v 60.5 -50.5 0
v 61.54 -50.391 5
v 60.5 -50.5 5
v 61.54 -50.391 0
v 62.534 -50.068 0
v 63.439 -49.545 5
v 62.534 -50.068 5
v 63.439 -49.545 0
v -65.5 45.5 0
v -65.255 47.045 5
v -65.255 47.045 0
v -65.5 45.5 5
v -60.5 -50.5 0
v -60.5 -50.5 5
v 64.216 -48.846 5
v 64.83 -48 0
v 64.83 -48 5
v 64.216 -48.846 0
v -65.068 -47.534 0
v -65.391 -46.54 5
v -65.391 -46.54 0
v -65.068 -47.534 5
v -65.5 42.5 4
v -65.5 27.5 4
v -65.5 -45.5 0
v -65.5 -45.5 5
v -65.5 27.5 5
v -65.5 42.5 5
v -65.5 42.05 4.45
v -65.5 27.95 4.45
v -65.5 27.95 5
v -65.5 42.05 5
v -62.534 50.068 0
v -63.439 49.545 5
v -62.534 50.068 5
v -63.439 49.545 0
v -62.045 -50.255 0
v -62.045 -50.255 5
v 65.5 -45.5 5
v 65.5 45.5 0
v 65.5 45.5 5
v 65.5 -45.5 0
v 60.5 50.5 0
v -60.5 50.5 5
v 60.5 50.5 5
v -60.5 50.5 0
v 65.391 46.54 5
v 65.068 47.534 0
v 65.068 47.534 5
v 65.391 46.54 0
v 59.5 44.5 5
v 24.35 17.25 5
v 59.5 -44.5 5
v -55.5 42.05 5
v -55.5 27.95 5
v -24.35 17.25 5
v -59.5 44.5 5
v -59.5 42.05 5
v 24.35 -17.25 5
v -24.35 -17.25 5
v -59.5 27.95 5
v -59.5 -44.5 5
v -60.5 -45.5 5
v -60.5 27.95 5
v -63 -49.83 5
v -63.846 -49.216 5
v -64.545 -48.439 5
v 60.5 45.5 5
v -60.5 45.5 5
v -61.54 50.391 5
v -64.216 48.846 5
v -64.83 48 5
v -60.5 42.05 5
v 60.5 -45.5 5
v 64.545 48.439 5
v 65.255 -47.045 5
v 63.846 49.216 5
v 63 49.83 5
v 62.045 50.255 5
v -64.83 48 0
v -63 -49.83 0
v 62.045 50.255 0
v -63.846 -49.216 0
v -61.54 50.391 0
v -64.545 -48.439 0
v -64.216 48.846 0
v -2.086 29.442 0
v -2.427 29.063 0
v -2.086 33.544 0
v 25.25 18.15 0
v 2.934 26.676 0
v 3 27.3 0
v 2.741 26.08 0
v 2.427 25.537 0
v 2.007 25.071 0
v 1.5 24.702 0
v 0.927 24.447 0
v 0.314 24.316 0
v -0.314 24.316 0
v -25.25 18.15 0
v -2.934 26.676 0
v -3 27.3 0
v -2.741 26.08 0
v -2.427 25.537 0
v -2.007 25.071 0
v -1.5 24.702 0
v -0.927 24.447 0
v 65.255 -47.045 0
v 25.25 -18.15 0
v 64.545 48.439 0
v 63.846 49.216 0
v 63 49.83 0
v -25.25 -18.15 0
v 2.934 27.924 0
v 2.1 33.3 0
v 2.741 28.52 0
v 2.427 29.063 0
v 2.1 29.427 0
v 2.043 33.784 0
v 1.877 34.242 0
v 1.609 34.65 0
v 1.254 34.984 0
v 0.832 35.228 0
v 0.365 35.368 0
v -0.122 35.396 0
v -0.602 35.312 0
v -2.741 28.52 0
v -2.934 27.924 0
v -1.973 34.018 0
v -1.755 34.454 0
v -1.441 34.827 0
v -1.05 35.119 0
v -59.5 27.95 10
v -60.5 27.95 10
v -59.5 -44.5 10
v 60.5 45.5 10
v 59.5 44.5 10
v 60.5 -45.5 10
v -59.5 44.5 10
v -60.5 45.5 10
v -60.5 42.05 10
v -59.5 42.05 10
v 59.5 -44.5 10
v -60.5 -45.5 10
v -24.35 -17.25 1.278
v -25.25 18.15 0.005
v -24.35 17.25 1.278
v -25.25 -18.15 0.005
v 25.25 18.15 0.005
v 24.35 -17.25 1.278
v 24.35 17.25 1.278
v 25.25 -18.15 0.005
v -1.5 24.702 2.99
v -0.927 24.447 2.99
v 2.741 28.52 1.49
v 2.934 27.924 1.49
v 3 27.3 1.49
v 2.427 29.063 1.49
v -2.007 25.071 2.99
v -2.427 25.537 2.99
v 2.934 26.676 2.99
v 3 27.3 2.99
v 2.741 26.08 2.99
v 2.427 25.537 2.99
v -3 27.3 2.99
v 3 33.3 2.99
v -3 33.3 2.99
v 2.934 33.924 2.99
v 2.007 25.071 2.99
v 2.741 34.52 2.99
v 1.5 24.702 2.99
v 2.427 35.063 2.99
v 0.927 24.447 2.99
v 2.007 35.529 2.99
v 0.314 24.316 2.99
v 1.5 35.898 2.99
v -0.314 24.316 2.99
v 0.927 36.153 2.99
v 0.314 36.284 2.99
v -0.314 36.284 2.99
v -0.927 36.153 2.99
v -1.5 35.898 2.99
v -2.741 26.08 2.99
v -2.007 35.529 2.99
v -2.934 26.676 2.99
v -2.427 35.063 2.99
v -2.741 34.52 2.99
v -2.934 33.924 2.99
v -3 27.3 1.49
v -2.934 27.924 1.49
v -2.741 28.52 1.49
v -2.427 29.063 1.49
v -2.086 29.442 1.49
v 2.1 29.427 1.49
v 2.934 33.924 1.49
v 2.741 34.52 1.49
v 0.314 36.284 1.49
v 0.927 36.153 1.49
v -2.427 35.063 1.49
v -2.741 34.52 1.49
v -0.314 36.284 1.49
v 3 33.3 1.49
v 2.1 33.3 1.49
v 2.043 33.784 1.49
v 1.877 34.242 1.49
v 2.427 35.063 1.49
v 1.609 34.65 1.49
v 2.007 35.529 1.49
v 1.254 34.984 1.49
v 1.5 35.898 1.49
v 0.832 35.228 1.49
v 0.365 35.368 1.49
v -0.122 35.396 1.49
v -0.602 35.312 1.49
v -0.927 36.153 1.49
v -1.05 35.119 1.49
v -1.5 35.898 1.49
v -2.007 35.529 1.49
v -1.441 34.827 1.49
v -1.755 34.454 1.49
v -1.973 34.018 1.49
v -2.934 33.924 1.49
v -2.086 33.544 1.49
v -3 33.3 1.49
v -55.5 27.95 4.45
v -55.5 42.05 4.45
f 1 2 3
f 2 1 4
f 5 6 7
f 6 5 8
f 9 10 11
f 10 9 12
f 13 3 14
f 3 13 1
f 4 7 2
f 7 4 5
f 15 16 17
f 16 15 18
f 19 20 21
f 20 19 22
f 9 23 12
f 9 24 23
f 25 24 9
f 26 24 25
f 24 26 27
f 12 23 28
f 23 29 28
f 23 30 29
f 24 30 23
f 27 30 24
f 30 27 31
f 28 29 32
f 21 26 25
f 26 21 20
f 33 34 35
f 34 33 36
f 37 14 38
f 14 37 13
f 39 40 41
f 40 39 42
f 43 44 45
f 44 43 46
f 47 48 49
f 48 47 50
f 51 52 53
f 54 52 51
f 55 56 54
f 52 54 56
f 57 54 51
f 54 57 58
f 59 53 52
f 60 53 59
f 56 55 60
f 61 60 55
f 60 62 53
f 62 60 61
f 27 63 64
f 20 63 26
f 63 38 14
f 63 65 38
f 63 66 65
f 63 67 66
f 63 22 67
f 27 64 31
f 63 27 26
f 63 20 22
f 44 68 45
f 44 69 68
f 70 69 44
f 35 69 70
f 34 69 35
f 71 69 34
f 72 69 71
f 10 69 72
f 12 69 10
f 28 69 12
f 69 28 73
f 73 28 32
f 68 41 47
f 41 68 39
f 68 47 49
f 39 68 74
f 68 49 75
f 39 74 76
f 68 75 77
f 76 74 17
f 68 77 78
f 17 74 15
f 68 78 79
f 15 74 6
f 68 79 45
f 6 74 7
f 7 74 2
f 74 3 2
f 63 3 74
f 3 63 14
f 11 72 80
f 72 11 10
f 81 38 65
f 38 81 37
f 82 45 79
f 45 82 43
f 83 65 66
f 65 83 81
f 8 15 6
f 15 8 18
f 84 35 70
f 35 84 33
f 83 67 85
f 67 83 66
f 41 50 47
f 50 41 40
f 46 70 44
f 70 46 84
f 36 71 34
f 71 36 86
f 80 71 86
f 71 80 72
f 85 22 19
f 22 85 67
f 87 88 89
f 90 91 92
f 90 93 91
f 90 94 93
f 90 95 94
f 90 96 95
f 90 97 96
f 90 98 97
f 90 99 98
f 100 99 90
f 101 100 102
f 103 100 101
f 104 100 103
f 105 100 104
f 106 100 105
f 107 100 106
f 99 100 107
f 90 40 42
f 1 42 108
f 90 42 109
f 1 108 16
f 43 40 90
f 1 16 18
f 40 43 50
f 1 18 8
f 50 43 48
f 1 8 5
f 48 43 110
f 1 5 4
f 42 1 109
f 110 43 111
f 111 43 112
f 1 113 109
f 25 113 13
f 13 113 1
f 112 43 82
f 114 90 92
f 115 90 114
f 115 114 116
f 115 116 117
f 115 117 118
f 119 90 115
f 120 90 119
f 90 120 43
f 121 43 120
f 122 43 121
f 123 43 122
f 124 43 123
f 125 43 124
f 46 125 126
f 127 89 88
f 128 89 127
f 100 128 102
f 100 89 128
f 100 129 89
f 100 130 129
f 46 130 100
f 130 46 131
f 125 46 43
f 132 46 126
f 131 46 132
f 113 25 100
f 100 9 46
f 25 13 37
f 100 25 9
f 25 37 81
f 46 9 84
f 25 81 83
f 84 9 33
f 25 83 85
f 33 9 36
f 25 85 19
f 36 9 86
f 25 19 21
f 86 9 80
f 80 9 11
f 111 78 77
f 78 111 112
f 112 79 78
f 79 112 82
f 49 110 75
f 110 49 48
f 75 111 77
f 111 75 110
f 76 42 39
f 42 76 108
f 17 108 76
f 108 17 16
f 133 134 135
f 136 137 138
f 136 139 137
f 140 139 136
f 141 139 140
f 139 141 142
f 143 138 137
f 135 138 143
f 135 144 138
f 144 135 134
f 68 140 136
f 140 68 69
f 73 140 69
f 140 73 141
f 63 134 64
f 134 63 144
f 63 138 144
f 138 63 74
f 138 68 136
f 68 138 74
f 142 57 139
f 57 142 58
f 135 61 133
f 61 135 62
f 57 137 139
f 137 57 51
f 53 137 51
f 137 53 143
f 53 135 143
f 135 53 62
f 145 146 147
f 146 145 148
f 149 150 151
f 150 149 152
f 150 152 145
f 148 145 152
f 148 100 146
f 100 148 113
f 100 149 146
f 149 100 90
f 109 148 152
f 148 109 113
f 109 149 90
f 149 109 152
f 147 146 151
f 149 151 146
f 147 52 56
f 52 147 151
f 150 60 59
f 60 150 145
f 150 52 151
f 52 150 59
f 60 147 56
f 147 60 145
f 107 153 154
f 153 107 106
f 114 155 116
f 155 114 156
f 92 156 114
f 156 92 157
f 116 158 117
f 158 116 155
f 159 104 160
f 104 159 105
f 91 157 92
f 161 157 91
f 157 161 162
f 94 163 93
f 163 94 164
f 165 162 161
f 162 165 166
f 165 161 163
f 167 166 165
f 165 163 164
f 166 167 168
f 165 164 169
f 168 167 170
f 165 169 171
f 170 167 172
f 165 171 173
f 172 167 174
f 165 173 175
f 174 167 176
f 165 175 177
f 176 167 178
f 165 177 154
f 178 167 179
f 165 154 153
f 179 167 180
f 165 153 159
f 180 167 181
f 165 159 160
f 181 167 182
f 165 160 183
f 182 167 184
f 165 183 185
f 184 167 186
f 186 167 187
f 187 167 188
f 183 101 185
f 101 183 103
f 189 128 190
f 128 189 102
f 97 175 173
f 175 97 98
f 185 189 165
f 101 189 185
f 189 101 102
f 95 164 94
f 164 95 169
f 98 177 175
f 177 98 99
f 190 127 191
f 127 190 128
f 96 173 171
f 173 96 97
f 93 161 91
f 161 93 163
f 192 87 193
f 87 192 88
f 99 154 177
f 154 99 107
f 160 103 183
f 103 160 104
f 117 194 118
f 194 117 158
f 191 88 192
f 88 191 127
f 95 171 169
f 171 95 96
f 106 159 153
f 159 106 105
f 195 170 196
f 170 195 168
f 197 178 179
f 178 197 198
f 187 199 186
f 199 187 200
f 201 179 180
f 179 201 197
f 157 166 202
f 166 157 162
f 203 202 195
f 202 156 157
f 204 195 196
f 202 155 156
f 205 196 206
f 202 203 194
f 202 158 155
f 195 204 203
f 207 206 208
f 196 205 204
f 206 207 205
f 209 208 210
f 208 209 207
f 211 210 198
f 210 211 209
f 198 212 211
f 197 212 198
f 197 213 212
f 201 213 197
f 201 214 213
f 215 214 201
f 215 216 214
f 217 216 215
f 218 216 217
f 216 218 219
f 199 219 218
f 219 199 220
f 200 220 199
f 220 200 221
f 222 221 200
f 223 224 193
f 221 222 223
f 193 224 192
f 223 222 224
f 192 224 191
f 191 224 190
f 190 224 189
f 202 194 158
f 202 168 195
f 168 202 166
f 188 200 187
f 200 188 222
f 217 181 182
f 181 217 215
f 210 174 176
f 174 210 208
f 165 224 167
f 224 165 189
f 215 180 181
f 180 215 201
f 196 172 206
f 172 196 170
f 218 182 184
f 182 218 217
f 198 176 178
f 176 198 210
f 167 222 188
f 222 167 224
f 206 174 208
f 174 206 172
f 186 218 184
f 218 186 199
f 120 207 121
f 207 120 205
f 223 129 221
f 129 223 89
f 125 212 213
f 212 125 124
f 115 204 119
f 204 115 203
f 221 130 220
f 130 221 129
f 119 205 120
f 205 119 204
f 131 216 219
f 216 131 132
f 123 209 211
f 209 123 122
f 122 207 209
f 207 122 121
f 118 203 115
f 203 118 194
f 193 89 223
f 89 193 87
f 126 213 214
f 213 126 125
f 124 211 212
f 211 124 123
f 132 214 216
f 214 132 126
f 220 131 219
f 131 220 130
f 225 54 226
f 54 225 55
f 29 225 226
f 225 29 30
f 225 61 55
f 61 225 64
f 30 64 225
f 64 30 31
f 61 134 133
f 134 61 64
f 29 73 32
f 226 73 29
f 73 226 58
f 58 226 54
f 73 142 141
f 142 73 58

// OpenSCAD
// file: battery-box/terminal.scad
$fs = 0.5;

base_terminal_size = [10, 1, 10];

module cutout_base(thickness) {
  translate([0, 0, -0.01]) {
    linear_extrude(thickness + 0.02) {
      hull() {
        translate([0, -2, 0]) circle(0.7);
        translate([0, 2, 0]) circle(0.7);
      }
    }
  }
}

module cutout(dimensions) {
  rotate([-90, -90, 0]) {
    translate(v=[dimensions.z / 2 + dimensions.z / 6, dimensions.x / 2, 0])
      cutout_base(dimensions.y);
    translate(v=[dimensions.z / 2 - dimensions.z / 6, dimensions.x / 2, 0])
      cutout_base(dimensions.y);
  }
}

module terminal(dimensions = [9, 0.5, 9]) {
  difference() {
    scale(
      [
        dimensions.x / base_terminal_size.x,
        dimensions.y / base_terminal_size.y,
        dimensions.z / base_terminal_size.z,
      ]
    )
      translate([0, base_terminal_size.y, base_terminal_size.x]) {
        rotate([90, 90, 0]) {
          linear_extrude(base_terminal_size.y) {
            square([base_terminal_size.x, base_terminal_size.z]);
          }
        }
      }
    cutout(dimensions);
  }
}

terminal();
// file: battery-box/spring.scad
use <terminal.scad>;

base_spring_size = [12, 4];

module spring_half() {

  // dont even ask
  line = concat(
    // flat line
    [[4, 2]],
    // wide curve
    [for (i = [1.5:-0.05:-1.5]) [i, sqrt(1 - ( (i - 1.5) / 3) ^ 2) * 2]],
    // semi-circle (half of the horizontal spring)
    [for (i = [-1.5:0.05:0]) [i, -sqrt(1 - ( (i + 0.75) / 0.75) ^ 2) * 0.75]]
  );

  polygon(concat(line, [for (i = [len(line) - 1:-1:0]) line[i] + [0.001, 0.001]]));
}

module spring_one_side() {
  spring_half();
  rotate([0, 0, 180]) spring_half();
}

module spring(dimensions = [10, 3, 10], thickness = 0.5) {
  spring_scale = [
    (dimensions.x - thickness) / (base_spring_size.x),
    (dimensions.y - thickness) / (base_spring_size.y),
  ];
  spring_size = [
    base_spring_size.x * spring_scale.x,
    base_spring_size.y * spring_scale.y,
  ] + [thickness, thickness];

  // behaves weird in preview
  difference() {
    // scaled spring
    translate(spring_size / 2) {
      linear_extrude(dimensions.z) {
        offset(r=thickness / 2) {
          scale(spring_scale) {
            translate([-3, 0, 0]) spring_one_side();
            mirror([1, 0, 0])
              translate([-3, 0, 0]) spring_one_side();
          }
        }
      }
    }

    // cutout
    cutout_thickness = thickness * 1.53;
    translate([0, dimensions.y - cutout_thickness, 0])
      cutout([dimensions.x, cutout_thickness, dimensions.z]);

    // trim ends
    color("red") {
      translate([-dimensions.x, -0.01, 0])
        cube(dimensions);
      translate([dimensions.x, -0.01, 0])
        cube(dimensions);
    }
  }
}

// cutout();
spring();
// file: battery-box/battery-box.scad
use <spring.scad>;
use <terminal.scad>;

$fs = 0.5;

aaa_battery_size = [10.5, 45];
aa_battery_size = [14.5, 50.5];

thickness = 0.8;

battery_count = 3; // I use 3xAAA for 5v LED strip
stack_in_line = !true;
spacing = [0.7, 0.5];

spring_thickness = 0.5;
spring_size = [aaa_battery_size.x, 3, aaa_battery_size.x - 0.05];

cell_with_spring_length = aaa_battery_size.y + spring_size.y + spacing.y;
cell_without_spring_length = aaa_battery_size.y + spacing.y;

function get_battery_box_dimensions() =
  (stack_in_line) ?
    [
      aaa_battery_size.x + spacing.x * 2,
      // wall_length
      cell_with_spring_length + cell_without_spring_length * (battery_count - 1),
      aaa_battery_size.x,
    ]
  : [
    aaa_battery_size.x * battery_count + spacing.x * (battery_count + 1),
    cell_with_spring_length,
    aaa_battery_size.x,
  ];

notch_width = 1;

function get_notch_height() = notch_width * sqrt(2);

module inline_separator() {
  translate([0, spacing.y, aaa_battery_size.x]) {
    rotate([90, 90, 0]) {
      linear_extrude(spacing.y) {
        difference() {
          polygon([[0, 0], [1, 0], [1, 1], [0, 1], [0.5, 0.5]] * aaa_battery_size.x);
          hull() {
            translate([0.5, 0.5] * aaa_battery_size.x) circle(r=0.3 * aaa_battery_size.x);
            translate([0, 0.2] * aaa_battery_size.x) square([0.1, 0.6] * aaa_battery_size.x);
          }
        }
      }
    }
  }
}

module parallel_separator() {
  translate([0, 0, aaa_battery_size.x]) {
    rotate([0, 90, 0]) {
      linear_extrude(spacing.x) {
        difference() {
          intersection() {
            offset(r=-1)
              offset(r=2) {
                polygon(
                  [
                    for (
                      dim = [
                        [0.1, 0],
                        [1, 0],
                        [1, 1],
                        [0.1, 1],
                        [0.1, 0.85],
                        [0.5, 0.85],
                        [0.5, 0.15],
                        [0.1, 0.15],
                      ]
                    ) [dim.x * aaa_battery_size.x, dim.y * cell_with_spring_length],
                  ]
                );
              }
            square([aaa_battery_size.x, cell_with_spring_length]);
          }
          slot_offset = spacing.y;
          slot_width = spacing.y * 1.5;
          translate(
            [
              aaa_battery_size.x * 0.15,
              cell_with_spring_length - slot_offset - slot_width,
            ]
          )
            square([aaa_battery_size.x * 0.7, slot_width]);
          translate([aaa_battery_size.x * 0.15, slot_offset])
            square([aaa_battery_size.x * 0.7, slot_width]);
        }
      }
    }
  }
}

module cell_with_spring() {
  spring_offset = [0, 0.5];
  spring(spring_size);
  linear_extrude(thickness)
    translate([0, spring_size.y] + spring_offset)
      square(aaa_battery_size - spring_offset);
}

module cell_without_spring() {
  linear_extrude(thickness)
    square(aaa_battery_size);
}

module wall(length) {
  linear_extrude(height=aaa_battery_size.x)
    square([spacing.x, length]);
}

module wall_without_spring() {
  wall(cell_without_spring_length);
}

module terminal_sized() {
  terminal([aaa_battery_size.x, spacing.y, aaa_battery_size.x]);
}

module notch() {
  notch_base_size = [get_battery_box_dimensions().x, get_battery_box_dimensions().y, 0.01];
  difference() {
    hull() {
      cube(notch_base_size, center=true);
      translate([0, 0, get_notch_height()])
        cube(notch_base_size + notch_width * 2 * [1, 1, 0], center=true);
    }
    cube(get_battery_box_dimensions(), center=true);
  }
}

module battery_box() {
  first_cell_size = [aaa_battery_size.x, spring_size.y + aaa_battery_size.y];
  inline_cell_size = [aaa_battery_size.x, spacing.y + aaa_battery_size.y];
  parallel_cell_size = [spacing.x + aaa_battery_size.x, aaa_battery_size.y];
  if (stack_in_line) {
    wall_length = cell_with_spring_length + cell_without_spring_length * (battery_count - 1);
    wall(wall_length);
    translate([spacing.x, 0]) {
      cell_with_spring();
      translate([spring_size.x, 0]) {
        wall(wall_length);
      }
    }
    if (battery_count > 1) {
      for (i = [1:battery_count - 1]) {
        offset = [0, first_cell_size.y + inline_cell_size.y * (i - 1)];
        translate(offset) {
          translate([spacing.x, 0]) {
            inline_separator();
            translate([0, spacing.y]) cell_without_spring();
          }
        }
      }
    }
    translate(
      [spacing.x, first_cell_size.y + inline_cell_size.y * (battery_count - 1)]
    ) {
      terminal_sized();
    }
  } else {
    wall(cell_with_spring_length);
    translate(
      [
        spacing.x + first_cell_size.x + parallel_cell_size.x * (battery_count - 1),
        0,
      ]
    ) {
      wall(cell_with_spring_length);
    }
    translate([spacing.x, 0]) {
      cell_with_spring();
      translate([0, first_cell_size.y, 0]) terminal_sized();
      if (battery_count > 1) {
        for (i = [1:battery_count - 1]) {
          offset = [first_cell_size.x + parallel_cell_size.x * (i - 1), 0];
          translate(offset) {
            parallel_separator();
            if (i % 2 == 1) {
              translate([0, first_cell_size.y + spacing.y])
                mirror([0, 1, 0]) {
                  translate([spacing.x, 0]) cell_with_spring();
                  translate([spacing.x, first_cell_size.y, 0]) terminal_sized();
                }
            } else {
              translate([spacing.x, 0]) cell_with_spring();
              translate([spacing.x, first_cell_size.y, 0]) terminal_sized();
            }
          }
        }
      }
    }
  }

  translate(
    get_battery_box_dimensions() / 2 + [0, 0, get_battery_box_dimensions().z / 2 - get_notch_height()]
  )
    notch();
}

module battery_box_cutout() {
  translation_up = [0, 0, get_battery_box_dimensions().z / 2];
  color("#d888") {
    translate(translation_up) {
      cube(get_battery_box_dimensions() + [0.2, 0.2, 0.2], center=true);
      translate([0, 0, get_battery_box_dimensions().z / 2 - get_notch_height()])
        notch();
    }
  }
}

if ($preview)
  translate(
    [get_battery_box_dimensions().x, get_battery_box_dimensions().y, 0] / 2 + (
      [get_battery_box_dimensions().x * 1.2, 0, 0]
    )
  )
    battery_box_cutout();

battery_box();
// file: common.scad
$fs = 0.5;

lithophane_width = 121;
lithophane_height = 91;
lithophane_thickness = 4;
lithophane_offset = 1;
led_strip_thickness = 10;
led_lithophane_spacing = 7;

backpanel_thickness = 5;
backpanel_protrusion = 5;
led_backpanel_spacing = 5;

led_strip_start = lithophane_offset + lithophane_thickness + led_lithophane_spacing;
wall_height = led_strip_start + led_strip_thickness + backpanel_protrusion + led_backpanel_spacing;
wall_thickness = 5;

lithophane_size = [lithophane_width, lithophane_height];

notch_width = 10;
notch_height = 2;

module lithophane_surface() {
  square(size=lithophane_size, center=true);
}

module box_surface() {
  offset(r=wall_thickness) {
    lithophane_surface();
  }
}
// file: switch.scad
// harsh approximation of KCD1-11 switch

front_panel_width = 15;
front_panel_height = 10;

// function for the sake of export
function get_switch_body_dimensions() = [10, 14, 9];

switch_body_dimensions = get_switch_body_dimensions();

module switch(body_offset = 0) {
  body_depth = switch_body_dimensions.x;
  color("#1b1b1be8") {
    translate([body_depth / 2, front_panel_width / 2, front_panel_height / 2]) {
      rotate([0, -90, 0]) {
        // front panel
        translate([0, 0, body_depth / 2 + 0.25]) {
          hull() {
            translate([0, 0, 0.25]) {
              cube([front_panel_height - 1, front_panel_width - 1, 1], center=true);
            }
            cube([front_panel_height, front_panel_width, 0.5], center=true);
          }
        }

        // main body
        cube([switch_body_dimensions.z + body_offset, switch_body_dimensions.y + body_offset, body_depth], center=true);

        // pins
        for (i = [-1:1]) {
          translate([0, 5 * i, -5.5]) {
            cube([4, 2, 1], center=true);
            translate([0, 0, -2]) {
              cube([3.7, 0.5, 3], center=true);
            }
          }
        }
      }
    }
  }
}

switch();
// file: backpanel.scad
include <common.scad>
use <battery-box/battery-box.scad>

module keyhole(diameter = 5) {
  radius = diameter / 2;
  height = radius;
  inner_radius = radius * 0.7;
  inner_height = height / 2;
  outer_height = height - inner_height;
  cylinder(h=height, r=radius);
  translate([0, 0, outer_height]) {
    hull() {
      cylinder(h=inner_height, r=radius);
      translate([0, diameter, 0])
        cylinder(h=inner_height, r=radius);
    }
  }
  hull() {
    cylinder(h=height, r=inner_radius);
    translate([0, diameter, 0])
      cylinder(h=height, r=inner_radius);
  }
}

module backpanel() {
  difference() {
    color("#055366ab") {
      linear_extrude(backpanel_thickness) {
        box_surface();
      }
      translate([0, 0, backpanel_thickness]) {
        linear_extrude(backpanel_protrusion) {
          difference() {
            lithophane_surface();
            offset(delta=-1) {
              lithophane_surface();
            }
          }
        }
      }
    }
    rotate([180, 0, 90])
      translate([0, 0, -get_battery_box_dimensions().z])
        battery_box_cutout();

    translate([0, lithophane_height / 2 * 0.6, -0.01])
      keyhole(diameter=6);
  }
}

backpanel();
// file: frame.scad
include <common.scad>

module notch() {
  color("#ca5a109f") {
    translate([-notch_width / 2, 0, notch_height]) {
      rotate([0, 90, 0]) {
        linear_extrude(height=notch_width) {
          polygon(
            points=[
              [-notch_height / 2, 0],
              [notch_height, 0],
              [0, notch_height],
            ]
          );
        }
      }
    }
  }
}

notch_offset = [
  lithophane_width / 2 - notch_width * 1.5,
  -lithophane_height / 2,
  lithophane_offset + lithophane_thickness,
];

module notch_pair() {
  translate([0, notch_offset.y, 0]) notch();
  mirror([0, 1, 0]) translate([0, notch_offset.y, 0]) notch();
}

module led_strip() {
  translate([0, 0, led_strip_start]) {
    color("#e7f071ff") {
      linear_extrude(led_strip_thickness) {
        difference() {
          offset(delta=0.3) lithophane_surface();
          offset(delta=-1) lithophane_surface();
        }
      }
    }
    color("#000") {
      translate([0, lithophane_height / 2 - 1, 3])
        rotate([90, 0, 0])
          linear_extrude(height=0.01)
            text("LED Strip preview", size=3, halign="center");
    }
  }
}

module frame_with_notches() {
  union() {
    color("#0abeebab") {
      // walls
      linear_extrude(height=wall_height) {
        difference() {
          box_surface();
          lithophane_surface();
        }
      }

      // thin frame in front of lithophane
      linear_extrude(lithophane_offset) {
        difference() {
          lithophane_surface();
          offset(r=3) offset(delta=-4) lithophane_surface();
        }
      }
    }

    // notches to secure lithophane in place
    translate([0, 0, notch_offset.z]) {
      translate([notch_offset.x, 0, 0]) notch_pair();
      translate([-notch_offset.x, 0, 0]) notch_pair();
    }
  }
}

module frame() {
  if ($preview) {
    union() {
      frame_with_notches();
      led_strip();
    }
  } else {
    difference() {
      frame_with_notches();
      led_strip();
    }
  }
}

frame();
// main file
use <frame.scad>
use <backpanel.scad>
use <switch.scad>
include <common.scad>

show_frame = !true;
show_backpanel = true;

module switch_placed() {
  translate(
    [
      -(lithophane_width / 2 + wall_thickness),
      -(lithophane_height / 2 - 3),
      wall_height - get_switch_body_dimensions().z,
    ]
  )
    switch(body_offset=0.1);
}

if (show_frame) {
  difference() {
    union() frame();
    switch_placed();
  }
}

if (show_backpanel) {
  backpanel_placement = [0, 0, wall_height + backpanel_thickness];
  backpanel_rotation = [180, 0, 0];
  backpanel_y_offset = show_frame ? lithophane_height + wall_thickness * 3 : 0;

  translate([0, backpanel_y_offset, 0]) {
    rotate(backpanel_rotation) {
      translate(-backpanel_placement) {
        difference() {
          translate(backpanel_placement) {
            rotate(backpanel_rotation) {
              backpanel();
            }
          }
          switch_placed();
        }
      }
    }
  }
}
